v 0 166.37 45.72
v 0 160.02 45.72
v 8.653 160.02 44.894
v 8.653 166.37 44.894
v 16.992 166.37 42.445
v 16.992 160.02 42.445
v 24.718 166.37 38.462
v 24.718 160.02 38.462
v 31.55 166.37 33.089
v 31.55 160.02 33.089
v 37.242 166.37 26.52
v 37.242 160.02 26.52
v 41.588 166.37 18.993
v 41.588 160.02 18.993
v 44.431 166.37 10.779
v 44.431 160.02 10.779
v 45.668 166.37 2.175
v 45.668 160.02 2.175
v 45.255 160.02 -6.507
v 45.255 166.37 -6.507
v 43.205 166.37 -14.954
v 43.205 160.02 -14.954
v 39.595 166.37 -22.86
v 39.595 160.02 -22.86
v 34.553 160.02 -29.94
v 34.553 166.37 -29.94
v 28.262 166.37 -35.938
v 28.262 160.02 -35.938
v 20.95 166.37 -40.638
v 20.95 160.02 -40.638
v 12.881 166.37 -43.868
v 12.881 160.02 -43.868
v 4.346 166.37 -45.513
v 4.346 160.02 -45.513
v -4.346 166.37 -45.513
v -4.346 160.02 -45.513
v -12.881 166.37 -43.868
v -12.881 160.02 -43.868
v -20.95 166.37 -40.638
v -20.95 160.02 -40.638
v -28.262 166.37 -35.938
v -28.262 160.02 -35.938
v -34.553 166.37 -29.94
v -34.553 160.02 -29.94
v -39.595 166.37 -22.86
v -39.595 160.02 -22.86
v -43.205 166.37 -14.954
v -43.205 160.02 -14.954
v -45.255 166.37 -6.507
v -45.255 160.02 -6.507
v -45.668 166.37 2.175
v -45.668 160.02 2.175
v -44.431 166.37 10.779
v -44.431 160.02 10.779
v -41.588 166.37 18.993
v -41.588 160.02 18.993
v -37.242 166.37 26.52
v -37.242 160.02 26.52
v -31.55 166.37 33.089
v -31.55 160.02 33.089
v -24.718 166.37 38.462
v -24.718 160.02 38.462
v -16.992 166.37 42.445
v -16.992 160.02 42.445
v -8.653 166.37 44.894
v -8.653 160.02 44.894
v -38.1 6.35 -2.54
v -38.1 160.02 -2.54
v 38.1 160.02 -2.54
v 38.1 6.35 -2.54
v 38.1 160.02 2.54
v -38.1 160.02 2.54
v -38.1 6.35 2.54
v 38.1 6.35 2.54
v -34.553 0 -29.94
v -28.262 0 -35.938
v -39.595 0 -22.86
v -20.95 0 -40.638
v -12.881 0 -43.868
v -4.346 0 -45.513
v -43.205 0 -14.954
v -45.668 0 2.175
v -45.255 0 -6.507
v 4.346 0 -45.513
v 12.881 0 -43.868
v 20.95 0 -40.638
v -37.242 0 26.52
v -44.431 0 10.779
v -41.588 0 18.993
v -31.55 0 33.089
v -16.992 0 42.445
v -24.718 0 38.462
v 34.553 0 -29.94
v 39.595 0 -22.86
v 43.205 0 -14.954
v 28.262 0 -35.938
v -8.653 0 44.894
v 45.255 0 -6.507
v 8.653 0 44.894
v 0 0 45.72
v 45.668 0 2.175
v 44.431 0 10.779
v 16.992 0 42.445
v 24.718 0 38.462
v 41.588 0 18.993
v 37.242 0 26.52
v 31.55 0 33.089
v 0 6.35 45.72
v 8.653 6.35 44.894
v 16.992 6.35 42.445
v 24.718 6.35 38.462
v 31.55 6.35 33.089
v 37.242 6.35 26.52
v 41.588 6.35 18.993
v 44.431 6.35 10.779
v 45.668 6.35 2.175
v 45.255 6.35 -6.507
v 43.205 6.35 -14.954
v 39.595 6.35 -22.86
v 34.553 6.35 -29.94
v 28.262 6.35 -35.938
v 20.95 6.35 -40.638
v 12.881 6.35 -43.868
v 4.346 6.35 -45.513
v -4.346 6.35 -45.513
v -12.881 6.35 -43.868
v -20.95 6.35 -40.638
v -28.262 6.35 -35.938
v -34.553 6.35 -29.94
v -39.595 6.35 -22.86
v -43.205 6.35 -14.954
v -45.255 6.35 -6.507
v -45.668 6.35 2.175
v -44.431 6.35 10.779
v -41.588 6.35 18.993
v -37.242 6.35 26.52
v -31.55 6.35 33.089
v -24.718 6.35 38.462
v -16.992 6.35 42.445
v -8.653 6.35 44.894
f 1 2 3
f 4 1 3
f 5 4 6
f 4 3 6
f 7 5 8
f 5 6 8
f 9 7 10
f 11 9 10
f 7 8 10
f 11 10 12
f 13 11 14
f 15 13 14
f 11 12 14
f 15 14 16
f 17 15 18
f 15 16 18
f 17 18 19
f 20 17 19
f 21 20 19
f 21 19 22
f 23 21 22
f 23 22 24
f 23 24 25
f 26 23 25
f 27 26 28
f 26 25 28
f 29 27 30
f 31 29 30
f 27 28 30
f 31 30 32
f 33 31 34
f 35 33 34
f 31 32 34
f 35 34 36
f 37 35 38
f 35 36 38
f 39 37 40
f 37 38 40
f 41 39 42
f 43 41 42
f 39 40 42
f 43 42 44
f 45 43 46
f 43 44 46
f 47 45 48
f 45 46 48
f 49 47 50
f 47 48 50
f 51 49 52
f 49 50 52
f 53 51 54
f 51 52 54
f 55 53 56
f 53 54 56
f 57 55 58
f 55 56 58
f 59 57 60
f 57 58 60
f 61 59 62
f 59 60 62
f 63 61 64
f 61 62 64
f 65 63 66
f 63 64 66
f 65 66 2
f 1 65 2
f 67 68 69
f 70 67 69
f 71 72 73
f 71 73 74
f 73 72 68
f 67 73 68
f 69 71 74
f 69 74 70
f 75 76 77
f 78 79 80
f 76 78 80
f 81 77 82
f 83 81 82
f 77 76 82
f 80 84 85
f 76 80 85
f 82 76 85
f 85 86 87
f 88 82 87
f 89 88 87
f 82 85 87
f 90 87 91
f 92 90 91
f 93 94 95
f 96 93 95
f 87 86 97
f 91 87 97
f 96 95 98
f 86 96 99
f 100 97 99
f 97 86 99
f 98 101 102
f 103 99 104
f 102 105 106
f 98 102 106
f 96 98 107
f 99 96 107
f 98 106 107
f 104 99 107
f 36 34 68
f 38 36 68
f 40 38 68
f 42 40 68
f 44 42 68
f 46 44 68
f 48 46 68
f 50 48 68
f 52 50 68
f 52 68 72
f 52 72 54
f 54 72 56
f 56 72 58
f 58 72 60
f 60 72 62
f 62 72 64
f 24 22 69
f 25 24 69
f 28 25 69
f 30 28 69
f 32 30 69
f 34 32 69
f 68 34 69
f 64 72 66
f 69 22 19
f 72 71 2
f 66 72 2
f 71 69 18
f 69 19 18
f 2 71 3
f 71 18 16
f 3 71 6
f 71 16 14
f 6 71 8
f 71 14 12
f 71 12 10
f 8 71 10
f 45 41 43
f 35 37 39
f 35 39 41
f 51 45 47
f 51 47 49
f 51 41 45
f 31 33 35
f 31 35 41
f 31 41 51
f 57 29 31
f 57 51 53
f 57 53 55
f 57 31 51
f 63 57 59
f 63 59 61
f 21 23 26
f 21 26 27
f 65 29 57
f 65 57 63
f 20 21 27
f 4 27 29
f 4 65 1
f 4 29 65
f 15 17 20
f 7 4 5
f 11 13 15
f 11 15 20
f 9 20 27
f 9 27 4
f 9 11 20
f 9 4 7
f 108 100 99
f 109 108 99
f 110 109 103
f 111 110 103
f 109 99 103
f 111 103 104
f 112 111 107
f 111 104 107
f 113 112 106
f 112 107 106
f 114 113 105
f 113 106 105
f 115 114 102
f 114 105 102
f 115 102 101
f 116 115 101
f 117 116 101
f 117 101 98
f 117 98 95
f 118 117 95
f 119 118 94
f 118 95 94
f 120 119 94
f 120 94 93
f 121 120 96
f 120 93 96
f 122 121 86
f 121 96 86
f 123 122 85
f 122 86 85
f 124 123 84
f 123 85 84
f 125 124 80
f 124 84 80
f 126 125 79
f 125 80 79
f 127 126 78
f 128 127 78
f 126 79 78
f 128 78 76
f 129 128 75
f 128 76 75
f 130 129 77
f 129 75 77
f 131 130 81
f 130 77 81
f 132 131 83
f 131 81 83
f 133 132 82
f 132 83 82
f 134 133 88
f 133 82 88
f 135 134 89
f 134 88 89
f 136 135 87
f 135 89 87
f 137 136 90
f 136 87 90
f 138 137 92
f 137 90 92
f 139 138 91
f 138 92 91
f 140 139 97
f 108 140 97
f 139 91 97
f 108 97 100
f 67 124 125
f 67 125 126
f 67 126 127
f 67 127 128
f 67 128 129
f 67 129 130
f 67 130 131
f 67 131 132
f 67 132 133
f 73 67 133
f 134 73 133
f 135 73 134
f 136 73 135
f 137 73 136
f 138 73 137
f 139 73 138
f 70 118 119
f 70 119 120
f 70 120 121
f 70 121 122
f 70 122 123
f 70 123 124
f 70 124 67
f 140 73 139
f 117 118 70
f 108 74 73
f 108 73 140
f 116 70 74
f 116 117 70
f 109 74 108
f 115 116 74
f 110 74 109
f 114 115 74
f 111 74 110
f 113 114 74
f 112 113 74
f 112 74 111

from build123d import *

# Parameters (mm, degrees)
SKETCH1_R           = 45.72
BOSS_EXTRUDE1_DEPTH = 6.35
SKETCH2_W           = 76.2
SKETCH2_H           = 5.08
BOSS_EXTRUDE4_DEPTH = 153.67
SKETCH4_R           = 45.72
BOSS_EXTRUDE5_DEPTH = 6.35


with BuildPart() as part:
    # Sketch1 → Boss-Extrude1 (new body)
    with BuildSketch(Plane(origin=(0, 0, 0), x_dir=(1, 0, 0), z_dir=(0, 1, 0))):
        with Locations(Location((0, 0, 0), (0, 0, 270))):
            Circle(SKETCH1_R)
    extrude(amount=BOSS_EXTRUDE1_DEPTH)

    # Sketch2 → Boss-Extrude4 (add)
    with BuildSketch(Plane(origin=(0, 6.35, 0), x_dir=(1, 0, 0), z_dir=(0, 1, 0))):
        Rectangle(SKETCH2_W, SKETCH2_H)
    extrude(amount=BOSS_EXTRUDE4_DEPTH)

    # Sketch4 → Boss-Extrude5 (add)
    with BuildSketch(Plane(origin=(0, 160.02, 0), x_dir=(1, 0, 0), z_dir=(0, 1, 0))):
        with Locations(Location((0, 0, 0), (0, 0, 270))):
            Circle(SKETCH4_R)
    extrude(amount=BOSS_EXTRUDE5_DEPTH)


solid = part.part
